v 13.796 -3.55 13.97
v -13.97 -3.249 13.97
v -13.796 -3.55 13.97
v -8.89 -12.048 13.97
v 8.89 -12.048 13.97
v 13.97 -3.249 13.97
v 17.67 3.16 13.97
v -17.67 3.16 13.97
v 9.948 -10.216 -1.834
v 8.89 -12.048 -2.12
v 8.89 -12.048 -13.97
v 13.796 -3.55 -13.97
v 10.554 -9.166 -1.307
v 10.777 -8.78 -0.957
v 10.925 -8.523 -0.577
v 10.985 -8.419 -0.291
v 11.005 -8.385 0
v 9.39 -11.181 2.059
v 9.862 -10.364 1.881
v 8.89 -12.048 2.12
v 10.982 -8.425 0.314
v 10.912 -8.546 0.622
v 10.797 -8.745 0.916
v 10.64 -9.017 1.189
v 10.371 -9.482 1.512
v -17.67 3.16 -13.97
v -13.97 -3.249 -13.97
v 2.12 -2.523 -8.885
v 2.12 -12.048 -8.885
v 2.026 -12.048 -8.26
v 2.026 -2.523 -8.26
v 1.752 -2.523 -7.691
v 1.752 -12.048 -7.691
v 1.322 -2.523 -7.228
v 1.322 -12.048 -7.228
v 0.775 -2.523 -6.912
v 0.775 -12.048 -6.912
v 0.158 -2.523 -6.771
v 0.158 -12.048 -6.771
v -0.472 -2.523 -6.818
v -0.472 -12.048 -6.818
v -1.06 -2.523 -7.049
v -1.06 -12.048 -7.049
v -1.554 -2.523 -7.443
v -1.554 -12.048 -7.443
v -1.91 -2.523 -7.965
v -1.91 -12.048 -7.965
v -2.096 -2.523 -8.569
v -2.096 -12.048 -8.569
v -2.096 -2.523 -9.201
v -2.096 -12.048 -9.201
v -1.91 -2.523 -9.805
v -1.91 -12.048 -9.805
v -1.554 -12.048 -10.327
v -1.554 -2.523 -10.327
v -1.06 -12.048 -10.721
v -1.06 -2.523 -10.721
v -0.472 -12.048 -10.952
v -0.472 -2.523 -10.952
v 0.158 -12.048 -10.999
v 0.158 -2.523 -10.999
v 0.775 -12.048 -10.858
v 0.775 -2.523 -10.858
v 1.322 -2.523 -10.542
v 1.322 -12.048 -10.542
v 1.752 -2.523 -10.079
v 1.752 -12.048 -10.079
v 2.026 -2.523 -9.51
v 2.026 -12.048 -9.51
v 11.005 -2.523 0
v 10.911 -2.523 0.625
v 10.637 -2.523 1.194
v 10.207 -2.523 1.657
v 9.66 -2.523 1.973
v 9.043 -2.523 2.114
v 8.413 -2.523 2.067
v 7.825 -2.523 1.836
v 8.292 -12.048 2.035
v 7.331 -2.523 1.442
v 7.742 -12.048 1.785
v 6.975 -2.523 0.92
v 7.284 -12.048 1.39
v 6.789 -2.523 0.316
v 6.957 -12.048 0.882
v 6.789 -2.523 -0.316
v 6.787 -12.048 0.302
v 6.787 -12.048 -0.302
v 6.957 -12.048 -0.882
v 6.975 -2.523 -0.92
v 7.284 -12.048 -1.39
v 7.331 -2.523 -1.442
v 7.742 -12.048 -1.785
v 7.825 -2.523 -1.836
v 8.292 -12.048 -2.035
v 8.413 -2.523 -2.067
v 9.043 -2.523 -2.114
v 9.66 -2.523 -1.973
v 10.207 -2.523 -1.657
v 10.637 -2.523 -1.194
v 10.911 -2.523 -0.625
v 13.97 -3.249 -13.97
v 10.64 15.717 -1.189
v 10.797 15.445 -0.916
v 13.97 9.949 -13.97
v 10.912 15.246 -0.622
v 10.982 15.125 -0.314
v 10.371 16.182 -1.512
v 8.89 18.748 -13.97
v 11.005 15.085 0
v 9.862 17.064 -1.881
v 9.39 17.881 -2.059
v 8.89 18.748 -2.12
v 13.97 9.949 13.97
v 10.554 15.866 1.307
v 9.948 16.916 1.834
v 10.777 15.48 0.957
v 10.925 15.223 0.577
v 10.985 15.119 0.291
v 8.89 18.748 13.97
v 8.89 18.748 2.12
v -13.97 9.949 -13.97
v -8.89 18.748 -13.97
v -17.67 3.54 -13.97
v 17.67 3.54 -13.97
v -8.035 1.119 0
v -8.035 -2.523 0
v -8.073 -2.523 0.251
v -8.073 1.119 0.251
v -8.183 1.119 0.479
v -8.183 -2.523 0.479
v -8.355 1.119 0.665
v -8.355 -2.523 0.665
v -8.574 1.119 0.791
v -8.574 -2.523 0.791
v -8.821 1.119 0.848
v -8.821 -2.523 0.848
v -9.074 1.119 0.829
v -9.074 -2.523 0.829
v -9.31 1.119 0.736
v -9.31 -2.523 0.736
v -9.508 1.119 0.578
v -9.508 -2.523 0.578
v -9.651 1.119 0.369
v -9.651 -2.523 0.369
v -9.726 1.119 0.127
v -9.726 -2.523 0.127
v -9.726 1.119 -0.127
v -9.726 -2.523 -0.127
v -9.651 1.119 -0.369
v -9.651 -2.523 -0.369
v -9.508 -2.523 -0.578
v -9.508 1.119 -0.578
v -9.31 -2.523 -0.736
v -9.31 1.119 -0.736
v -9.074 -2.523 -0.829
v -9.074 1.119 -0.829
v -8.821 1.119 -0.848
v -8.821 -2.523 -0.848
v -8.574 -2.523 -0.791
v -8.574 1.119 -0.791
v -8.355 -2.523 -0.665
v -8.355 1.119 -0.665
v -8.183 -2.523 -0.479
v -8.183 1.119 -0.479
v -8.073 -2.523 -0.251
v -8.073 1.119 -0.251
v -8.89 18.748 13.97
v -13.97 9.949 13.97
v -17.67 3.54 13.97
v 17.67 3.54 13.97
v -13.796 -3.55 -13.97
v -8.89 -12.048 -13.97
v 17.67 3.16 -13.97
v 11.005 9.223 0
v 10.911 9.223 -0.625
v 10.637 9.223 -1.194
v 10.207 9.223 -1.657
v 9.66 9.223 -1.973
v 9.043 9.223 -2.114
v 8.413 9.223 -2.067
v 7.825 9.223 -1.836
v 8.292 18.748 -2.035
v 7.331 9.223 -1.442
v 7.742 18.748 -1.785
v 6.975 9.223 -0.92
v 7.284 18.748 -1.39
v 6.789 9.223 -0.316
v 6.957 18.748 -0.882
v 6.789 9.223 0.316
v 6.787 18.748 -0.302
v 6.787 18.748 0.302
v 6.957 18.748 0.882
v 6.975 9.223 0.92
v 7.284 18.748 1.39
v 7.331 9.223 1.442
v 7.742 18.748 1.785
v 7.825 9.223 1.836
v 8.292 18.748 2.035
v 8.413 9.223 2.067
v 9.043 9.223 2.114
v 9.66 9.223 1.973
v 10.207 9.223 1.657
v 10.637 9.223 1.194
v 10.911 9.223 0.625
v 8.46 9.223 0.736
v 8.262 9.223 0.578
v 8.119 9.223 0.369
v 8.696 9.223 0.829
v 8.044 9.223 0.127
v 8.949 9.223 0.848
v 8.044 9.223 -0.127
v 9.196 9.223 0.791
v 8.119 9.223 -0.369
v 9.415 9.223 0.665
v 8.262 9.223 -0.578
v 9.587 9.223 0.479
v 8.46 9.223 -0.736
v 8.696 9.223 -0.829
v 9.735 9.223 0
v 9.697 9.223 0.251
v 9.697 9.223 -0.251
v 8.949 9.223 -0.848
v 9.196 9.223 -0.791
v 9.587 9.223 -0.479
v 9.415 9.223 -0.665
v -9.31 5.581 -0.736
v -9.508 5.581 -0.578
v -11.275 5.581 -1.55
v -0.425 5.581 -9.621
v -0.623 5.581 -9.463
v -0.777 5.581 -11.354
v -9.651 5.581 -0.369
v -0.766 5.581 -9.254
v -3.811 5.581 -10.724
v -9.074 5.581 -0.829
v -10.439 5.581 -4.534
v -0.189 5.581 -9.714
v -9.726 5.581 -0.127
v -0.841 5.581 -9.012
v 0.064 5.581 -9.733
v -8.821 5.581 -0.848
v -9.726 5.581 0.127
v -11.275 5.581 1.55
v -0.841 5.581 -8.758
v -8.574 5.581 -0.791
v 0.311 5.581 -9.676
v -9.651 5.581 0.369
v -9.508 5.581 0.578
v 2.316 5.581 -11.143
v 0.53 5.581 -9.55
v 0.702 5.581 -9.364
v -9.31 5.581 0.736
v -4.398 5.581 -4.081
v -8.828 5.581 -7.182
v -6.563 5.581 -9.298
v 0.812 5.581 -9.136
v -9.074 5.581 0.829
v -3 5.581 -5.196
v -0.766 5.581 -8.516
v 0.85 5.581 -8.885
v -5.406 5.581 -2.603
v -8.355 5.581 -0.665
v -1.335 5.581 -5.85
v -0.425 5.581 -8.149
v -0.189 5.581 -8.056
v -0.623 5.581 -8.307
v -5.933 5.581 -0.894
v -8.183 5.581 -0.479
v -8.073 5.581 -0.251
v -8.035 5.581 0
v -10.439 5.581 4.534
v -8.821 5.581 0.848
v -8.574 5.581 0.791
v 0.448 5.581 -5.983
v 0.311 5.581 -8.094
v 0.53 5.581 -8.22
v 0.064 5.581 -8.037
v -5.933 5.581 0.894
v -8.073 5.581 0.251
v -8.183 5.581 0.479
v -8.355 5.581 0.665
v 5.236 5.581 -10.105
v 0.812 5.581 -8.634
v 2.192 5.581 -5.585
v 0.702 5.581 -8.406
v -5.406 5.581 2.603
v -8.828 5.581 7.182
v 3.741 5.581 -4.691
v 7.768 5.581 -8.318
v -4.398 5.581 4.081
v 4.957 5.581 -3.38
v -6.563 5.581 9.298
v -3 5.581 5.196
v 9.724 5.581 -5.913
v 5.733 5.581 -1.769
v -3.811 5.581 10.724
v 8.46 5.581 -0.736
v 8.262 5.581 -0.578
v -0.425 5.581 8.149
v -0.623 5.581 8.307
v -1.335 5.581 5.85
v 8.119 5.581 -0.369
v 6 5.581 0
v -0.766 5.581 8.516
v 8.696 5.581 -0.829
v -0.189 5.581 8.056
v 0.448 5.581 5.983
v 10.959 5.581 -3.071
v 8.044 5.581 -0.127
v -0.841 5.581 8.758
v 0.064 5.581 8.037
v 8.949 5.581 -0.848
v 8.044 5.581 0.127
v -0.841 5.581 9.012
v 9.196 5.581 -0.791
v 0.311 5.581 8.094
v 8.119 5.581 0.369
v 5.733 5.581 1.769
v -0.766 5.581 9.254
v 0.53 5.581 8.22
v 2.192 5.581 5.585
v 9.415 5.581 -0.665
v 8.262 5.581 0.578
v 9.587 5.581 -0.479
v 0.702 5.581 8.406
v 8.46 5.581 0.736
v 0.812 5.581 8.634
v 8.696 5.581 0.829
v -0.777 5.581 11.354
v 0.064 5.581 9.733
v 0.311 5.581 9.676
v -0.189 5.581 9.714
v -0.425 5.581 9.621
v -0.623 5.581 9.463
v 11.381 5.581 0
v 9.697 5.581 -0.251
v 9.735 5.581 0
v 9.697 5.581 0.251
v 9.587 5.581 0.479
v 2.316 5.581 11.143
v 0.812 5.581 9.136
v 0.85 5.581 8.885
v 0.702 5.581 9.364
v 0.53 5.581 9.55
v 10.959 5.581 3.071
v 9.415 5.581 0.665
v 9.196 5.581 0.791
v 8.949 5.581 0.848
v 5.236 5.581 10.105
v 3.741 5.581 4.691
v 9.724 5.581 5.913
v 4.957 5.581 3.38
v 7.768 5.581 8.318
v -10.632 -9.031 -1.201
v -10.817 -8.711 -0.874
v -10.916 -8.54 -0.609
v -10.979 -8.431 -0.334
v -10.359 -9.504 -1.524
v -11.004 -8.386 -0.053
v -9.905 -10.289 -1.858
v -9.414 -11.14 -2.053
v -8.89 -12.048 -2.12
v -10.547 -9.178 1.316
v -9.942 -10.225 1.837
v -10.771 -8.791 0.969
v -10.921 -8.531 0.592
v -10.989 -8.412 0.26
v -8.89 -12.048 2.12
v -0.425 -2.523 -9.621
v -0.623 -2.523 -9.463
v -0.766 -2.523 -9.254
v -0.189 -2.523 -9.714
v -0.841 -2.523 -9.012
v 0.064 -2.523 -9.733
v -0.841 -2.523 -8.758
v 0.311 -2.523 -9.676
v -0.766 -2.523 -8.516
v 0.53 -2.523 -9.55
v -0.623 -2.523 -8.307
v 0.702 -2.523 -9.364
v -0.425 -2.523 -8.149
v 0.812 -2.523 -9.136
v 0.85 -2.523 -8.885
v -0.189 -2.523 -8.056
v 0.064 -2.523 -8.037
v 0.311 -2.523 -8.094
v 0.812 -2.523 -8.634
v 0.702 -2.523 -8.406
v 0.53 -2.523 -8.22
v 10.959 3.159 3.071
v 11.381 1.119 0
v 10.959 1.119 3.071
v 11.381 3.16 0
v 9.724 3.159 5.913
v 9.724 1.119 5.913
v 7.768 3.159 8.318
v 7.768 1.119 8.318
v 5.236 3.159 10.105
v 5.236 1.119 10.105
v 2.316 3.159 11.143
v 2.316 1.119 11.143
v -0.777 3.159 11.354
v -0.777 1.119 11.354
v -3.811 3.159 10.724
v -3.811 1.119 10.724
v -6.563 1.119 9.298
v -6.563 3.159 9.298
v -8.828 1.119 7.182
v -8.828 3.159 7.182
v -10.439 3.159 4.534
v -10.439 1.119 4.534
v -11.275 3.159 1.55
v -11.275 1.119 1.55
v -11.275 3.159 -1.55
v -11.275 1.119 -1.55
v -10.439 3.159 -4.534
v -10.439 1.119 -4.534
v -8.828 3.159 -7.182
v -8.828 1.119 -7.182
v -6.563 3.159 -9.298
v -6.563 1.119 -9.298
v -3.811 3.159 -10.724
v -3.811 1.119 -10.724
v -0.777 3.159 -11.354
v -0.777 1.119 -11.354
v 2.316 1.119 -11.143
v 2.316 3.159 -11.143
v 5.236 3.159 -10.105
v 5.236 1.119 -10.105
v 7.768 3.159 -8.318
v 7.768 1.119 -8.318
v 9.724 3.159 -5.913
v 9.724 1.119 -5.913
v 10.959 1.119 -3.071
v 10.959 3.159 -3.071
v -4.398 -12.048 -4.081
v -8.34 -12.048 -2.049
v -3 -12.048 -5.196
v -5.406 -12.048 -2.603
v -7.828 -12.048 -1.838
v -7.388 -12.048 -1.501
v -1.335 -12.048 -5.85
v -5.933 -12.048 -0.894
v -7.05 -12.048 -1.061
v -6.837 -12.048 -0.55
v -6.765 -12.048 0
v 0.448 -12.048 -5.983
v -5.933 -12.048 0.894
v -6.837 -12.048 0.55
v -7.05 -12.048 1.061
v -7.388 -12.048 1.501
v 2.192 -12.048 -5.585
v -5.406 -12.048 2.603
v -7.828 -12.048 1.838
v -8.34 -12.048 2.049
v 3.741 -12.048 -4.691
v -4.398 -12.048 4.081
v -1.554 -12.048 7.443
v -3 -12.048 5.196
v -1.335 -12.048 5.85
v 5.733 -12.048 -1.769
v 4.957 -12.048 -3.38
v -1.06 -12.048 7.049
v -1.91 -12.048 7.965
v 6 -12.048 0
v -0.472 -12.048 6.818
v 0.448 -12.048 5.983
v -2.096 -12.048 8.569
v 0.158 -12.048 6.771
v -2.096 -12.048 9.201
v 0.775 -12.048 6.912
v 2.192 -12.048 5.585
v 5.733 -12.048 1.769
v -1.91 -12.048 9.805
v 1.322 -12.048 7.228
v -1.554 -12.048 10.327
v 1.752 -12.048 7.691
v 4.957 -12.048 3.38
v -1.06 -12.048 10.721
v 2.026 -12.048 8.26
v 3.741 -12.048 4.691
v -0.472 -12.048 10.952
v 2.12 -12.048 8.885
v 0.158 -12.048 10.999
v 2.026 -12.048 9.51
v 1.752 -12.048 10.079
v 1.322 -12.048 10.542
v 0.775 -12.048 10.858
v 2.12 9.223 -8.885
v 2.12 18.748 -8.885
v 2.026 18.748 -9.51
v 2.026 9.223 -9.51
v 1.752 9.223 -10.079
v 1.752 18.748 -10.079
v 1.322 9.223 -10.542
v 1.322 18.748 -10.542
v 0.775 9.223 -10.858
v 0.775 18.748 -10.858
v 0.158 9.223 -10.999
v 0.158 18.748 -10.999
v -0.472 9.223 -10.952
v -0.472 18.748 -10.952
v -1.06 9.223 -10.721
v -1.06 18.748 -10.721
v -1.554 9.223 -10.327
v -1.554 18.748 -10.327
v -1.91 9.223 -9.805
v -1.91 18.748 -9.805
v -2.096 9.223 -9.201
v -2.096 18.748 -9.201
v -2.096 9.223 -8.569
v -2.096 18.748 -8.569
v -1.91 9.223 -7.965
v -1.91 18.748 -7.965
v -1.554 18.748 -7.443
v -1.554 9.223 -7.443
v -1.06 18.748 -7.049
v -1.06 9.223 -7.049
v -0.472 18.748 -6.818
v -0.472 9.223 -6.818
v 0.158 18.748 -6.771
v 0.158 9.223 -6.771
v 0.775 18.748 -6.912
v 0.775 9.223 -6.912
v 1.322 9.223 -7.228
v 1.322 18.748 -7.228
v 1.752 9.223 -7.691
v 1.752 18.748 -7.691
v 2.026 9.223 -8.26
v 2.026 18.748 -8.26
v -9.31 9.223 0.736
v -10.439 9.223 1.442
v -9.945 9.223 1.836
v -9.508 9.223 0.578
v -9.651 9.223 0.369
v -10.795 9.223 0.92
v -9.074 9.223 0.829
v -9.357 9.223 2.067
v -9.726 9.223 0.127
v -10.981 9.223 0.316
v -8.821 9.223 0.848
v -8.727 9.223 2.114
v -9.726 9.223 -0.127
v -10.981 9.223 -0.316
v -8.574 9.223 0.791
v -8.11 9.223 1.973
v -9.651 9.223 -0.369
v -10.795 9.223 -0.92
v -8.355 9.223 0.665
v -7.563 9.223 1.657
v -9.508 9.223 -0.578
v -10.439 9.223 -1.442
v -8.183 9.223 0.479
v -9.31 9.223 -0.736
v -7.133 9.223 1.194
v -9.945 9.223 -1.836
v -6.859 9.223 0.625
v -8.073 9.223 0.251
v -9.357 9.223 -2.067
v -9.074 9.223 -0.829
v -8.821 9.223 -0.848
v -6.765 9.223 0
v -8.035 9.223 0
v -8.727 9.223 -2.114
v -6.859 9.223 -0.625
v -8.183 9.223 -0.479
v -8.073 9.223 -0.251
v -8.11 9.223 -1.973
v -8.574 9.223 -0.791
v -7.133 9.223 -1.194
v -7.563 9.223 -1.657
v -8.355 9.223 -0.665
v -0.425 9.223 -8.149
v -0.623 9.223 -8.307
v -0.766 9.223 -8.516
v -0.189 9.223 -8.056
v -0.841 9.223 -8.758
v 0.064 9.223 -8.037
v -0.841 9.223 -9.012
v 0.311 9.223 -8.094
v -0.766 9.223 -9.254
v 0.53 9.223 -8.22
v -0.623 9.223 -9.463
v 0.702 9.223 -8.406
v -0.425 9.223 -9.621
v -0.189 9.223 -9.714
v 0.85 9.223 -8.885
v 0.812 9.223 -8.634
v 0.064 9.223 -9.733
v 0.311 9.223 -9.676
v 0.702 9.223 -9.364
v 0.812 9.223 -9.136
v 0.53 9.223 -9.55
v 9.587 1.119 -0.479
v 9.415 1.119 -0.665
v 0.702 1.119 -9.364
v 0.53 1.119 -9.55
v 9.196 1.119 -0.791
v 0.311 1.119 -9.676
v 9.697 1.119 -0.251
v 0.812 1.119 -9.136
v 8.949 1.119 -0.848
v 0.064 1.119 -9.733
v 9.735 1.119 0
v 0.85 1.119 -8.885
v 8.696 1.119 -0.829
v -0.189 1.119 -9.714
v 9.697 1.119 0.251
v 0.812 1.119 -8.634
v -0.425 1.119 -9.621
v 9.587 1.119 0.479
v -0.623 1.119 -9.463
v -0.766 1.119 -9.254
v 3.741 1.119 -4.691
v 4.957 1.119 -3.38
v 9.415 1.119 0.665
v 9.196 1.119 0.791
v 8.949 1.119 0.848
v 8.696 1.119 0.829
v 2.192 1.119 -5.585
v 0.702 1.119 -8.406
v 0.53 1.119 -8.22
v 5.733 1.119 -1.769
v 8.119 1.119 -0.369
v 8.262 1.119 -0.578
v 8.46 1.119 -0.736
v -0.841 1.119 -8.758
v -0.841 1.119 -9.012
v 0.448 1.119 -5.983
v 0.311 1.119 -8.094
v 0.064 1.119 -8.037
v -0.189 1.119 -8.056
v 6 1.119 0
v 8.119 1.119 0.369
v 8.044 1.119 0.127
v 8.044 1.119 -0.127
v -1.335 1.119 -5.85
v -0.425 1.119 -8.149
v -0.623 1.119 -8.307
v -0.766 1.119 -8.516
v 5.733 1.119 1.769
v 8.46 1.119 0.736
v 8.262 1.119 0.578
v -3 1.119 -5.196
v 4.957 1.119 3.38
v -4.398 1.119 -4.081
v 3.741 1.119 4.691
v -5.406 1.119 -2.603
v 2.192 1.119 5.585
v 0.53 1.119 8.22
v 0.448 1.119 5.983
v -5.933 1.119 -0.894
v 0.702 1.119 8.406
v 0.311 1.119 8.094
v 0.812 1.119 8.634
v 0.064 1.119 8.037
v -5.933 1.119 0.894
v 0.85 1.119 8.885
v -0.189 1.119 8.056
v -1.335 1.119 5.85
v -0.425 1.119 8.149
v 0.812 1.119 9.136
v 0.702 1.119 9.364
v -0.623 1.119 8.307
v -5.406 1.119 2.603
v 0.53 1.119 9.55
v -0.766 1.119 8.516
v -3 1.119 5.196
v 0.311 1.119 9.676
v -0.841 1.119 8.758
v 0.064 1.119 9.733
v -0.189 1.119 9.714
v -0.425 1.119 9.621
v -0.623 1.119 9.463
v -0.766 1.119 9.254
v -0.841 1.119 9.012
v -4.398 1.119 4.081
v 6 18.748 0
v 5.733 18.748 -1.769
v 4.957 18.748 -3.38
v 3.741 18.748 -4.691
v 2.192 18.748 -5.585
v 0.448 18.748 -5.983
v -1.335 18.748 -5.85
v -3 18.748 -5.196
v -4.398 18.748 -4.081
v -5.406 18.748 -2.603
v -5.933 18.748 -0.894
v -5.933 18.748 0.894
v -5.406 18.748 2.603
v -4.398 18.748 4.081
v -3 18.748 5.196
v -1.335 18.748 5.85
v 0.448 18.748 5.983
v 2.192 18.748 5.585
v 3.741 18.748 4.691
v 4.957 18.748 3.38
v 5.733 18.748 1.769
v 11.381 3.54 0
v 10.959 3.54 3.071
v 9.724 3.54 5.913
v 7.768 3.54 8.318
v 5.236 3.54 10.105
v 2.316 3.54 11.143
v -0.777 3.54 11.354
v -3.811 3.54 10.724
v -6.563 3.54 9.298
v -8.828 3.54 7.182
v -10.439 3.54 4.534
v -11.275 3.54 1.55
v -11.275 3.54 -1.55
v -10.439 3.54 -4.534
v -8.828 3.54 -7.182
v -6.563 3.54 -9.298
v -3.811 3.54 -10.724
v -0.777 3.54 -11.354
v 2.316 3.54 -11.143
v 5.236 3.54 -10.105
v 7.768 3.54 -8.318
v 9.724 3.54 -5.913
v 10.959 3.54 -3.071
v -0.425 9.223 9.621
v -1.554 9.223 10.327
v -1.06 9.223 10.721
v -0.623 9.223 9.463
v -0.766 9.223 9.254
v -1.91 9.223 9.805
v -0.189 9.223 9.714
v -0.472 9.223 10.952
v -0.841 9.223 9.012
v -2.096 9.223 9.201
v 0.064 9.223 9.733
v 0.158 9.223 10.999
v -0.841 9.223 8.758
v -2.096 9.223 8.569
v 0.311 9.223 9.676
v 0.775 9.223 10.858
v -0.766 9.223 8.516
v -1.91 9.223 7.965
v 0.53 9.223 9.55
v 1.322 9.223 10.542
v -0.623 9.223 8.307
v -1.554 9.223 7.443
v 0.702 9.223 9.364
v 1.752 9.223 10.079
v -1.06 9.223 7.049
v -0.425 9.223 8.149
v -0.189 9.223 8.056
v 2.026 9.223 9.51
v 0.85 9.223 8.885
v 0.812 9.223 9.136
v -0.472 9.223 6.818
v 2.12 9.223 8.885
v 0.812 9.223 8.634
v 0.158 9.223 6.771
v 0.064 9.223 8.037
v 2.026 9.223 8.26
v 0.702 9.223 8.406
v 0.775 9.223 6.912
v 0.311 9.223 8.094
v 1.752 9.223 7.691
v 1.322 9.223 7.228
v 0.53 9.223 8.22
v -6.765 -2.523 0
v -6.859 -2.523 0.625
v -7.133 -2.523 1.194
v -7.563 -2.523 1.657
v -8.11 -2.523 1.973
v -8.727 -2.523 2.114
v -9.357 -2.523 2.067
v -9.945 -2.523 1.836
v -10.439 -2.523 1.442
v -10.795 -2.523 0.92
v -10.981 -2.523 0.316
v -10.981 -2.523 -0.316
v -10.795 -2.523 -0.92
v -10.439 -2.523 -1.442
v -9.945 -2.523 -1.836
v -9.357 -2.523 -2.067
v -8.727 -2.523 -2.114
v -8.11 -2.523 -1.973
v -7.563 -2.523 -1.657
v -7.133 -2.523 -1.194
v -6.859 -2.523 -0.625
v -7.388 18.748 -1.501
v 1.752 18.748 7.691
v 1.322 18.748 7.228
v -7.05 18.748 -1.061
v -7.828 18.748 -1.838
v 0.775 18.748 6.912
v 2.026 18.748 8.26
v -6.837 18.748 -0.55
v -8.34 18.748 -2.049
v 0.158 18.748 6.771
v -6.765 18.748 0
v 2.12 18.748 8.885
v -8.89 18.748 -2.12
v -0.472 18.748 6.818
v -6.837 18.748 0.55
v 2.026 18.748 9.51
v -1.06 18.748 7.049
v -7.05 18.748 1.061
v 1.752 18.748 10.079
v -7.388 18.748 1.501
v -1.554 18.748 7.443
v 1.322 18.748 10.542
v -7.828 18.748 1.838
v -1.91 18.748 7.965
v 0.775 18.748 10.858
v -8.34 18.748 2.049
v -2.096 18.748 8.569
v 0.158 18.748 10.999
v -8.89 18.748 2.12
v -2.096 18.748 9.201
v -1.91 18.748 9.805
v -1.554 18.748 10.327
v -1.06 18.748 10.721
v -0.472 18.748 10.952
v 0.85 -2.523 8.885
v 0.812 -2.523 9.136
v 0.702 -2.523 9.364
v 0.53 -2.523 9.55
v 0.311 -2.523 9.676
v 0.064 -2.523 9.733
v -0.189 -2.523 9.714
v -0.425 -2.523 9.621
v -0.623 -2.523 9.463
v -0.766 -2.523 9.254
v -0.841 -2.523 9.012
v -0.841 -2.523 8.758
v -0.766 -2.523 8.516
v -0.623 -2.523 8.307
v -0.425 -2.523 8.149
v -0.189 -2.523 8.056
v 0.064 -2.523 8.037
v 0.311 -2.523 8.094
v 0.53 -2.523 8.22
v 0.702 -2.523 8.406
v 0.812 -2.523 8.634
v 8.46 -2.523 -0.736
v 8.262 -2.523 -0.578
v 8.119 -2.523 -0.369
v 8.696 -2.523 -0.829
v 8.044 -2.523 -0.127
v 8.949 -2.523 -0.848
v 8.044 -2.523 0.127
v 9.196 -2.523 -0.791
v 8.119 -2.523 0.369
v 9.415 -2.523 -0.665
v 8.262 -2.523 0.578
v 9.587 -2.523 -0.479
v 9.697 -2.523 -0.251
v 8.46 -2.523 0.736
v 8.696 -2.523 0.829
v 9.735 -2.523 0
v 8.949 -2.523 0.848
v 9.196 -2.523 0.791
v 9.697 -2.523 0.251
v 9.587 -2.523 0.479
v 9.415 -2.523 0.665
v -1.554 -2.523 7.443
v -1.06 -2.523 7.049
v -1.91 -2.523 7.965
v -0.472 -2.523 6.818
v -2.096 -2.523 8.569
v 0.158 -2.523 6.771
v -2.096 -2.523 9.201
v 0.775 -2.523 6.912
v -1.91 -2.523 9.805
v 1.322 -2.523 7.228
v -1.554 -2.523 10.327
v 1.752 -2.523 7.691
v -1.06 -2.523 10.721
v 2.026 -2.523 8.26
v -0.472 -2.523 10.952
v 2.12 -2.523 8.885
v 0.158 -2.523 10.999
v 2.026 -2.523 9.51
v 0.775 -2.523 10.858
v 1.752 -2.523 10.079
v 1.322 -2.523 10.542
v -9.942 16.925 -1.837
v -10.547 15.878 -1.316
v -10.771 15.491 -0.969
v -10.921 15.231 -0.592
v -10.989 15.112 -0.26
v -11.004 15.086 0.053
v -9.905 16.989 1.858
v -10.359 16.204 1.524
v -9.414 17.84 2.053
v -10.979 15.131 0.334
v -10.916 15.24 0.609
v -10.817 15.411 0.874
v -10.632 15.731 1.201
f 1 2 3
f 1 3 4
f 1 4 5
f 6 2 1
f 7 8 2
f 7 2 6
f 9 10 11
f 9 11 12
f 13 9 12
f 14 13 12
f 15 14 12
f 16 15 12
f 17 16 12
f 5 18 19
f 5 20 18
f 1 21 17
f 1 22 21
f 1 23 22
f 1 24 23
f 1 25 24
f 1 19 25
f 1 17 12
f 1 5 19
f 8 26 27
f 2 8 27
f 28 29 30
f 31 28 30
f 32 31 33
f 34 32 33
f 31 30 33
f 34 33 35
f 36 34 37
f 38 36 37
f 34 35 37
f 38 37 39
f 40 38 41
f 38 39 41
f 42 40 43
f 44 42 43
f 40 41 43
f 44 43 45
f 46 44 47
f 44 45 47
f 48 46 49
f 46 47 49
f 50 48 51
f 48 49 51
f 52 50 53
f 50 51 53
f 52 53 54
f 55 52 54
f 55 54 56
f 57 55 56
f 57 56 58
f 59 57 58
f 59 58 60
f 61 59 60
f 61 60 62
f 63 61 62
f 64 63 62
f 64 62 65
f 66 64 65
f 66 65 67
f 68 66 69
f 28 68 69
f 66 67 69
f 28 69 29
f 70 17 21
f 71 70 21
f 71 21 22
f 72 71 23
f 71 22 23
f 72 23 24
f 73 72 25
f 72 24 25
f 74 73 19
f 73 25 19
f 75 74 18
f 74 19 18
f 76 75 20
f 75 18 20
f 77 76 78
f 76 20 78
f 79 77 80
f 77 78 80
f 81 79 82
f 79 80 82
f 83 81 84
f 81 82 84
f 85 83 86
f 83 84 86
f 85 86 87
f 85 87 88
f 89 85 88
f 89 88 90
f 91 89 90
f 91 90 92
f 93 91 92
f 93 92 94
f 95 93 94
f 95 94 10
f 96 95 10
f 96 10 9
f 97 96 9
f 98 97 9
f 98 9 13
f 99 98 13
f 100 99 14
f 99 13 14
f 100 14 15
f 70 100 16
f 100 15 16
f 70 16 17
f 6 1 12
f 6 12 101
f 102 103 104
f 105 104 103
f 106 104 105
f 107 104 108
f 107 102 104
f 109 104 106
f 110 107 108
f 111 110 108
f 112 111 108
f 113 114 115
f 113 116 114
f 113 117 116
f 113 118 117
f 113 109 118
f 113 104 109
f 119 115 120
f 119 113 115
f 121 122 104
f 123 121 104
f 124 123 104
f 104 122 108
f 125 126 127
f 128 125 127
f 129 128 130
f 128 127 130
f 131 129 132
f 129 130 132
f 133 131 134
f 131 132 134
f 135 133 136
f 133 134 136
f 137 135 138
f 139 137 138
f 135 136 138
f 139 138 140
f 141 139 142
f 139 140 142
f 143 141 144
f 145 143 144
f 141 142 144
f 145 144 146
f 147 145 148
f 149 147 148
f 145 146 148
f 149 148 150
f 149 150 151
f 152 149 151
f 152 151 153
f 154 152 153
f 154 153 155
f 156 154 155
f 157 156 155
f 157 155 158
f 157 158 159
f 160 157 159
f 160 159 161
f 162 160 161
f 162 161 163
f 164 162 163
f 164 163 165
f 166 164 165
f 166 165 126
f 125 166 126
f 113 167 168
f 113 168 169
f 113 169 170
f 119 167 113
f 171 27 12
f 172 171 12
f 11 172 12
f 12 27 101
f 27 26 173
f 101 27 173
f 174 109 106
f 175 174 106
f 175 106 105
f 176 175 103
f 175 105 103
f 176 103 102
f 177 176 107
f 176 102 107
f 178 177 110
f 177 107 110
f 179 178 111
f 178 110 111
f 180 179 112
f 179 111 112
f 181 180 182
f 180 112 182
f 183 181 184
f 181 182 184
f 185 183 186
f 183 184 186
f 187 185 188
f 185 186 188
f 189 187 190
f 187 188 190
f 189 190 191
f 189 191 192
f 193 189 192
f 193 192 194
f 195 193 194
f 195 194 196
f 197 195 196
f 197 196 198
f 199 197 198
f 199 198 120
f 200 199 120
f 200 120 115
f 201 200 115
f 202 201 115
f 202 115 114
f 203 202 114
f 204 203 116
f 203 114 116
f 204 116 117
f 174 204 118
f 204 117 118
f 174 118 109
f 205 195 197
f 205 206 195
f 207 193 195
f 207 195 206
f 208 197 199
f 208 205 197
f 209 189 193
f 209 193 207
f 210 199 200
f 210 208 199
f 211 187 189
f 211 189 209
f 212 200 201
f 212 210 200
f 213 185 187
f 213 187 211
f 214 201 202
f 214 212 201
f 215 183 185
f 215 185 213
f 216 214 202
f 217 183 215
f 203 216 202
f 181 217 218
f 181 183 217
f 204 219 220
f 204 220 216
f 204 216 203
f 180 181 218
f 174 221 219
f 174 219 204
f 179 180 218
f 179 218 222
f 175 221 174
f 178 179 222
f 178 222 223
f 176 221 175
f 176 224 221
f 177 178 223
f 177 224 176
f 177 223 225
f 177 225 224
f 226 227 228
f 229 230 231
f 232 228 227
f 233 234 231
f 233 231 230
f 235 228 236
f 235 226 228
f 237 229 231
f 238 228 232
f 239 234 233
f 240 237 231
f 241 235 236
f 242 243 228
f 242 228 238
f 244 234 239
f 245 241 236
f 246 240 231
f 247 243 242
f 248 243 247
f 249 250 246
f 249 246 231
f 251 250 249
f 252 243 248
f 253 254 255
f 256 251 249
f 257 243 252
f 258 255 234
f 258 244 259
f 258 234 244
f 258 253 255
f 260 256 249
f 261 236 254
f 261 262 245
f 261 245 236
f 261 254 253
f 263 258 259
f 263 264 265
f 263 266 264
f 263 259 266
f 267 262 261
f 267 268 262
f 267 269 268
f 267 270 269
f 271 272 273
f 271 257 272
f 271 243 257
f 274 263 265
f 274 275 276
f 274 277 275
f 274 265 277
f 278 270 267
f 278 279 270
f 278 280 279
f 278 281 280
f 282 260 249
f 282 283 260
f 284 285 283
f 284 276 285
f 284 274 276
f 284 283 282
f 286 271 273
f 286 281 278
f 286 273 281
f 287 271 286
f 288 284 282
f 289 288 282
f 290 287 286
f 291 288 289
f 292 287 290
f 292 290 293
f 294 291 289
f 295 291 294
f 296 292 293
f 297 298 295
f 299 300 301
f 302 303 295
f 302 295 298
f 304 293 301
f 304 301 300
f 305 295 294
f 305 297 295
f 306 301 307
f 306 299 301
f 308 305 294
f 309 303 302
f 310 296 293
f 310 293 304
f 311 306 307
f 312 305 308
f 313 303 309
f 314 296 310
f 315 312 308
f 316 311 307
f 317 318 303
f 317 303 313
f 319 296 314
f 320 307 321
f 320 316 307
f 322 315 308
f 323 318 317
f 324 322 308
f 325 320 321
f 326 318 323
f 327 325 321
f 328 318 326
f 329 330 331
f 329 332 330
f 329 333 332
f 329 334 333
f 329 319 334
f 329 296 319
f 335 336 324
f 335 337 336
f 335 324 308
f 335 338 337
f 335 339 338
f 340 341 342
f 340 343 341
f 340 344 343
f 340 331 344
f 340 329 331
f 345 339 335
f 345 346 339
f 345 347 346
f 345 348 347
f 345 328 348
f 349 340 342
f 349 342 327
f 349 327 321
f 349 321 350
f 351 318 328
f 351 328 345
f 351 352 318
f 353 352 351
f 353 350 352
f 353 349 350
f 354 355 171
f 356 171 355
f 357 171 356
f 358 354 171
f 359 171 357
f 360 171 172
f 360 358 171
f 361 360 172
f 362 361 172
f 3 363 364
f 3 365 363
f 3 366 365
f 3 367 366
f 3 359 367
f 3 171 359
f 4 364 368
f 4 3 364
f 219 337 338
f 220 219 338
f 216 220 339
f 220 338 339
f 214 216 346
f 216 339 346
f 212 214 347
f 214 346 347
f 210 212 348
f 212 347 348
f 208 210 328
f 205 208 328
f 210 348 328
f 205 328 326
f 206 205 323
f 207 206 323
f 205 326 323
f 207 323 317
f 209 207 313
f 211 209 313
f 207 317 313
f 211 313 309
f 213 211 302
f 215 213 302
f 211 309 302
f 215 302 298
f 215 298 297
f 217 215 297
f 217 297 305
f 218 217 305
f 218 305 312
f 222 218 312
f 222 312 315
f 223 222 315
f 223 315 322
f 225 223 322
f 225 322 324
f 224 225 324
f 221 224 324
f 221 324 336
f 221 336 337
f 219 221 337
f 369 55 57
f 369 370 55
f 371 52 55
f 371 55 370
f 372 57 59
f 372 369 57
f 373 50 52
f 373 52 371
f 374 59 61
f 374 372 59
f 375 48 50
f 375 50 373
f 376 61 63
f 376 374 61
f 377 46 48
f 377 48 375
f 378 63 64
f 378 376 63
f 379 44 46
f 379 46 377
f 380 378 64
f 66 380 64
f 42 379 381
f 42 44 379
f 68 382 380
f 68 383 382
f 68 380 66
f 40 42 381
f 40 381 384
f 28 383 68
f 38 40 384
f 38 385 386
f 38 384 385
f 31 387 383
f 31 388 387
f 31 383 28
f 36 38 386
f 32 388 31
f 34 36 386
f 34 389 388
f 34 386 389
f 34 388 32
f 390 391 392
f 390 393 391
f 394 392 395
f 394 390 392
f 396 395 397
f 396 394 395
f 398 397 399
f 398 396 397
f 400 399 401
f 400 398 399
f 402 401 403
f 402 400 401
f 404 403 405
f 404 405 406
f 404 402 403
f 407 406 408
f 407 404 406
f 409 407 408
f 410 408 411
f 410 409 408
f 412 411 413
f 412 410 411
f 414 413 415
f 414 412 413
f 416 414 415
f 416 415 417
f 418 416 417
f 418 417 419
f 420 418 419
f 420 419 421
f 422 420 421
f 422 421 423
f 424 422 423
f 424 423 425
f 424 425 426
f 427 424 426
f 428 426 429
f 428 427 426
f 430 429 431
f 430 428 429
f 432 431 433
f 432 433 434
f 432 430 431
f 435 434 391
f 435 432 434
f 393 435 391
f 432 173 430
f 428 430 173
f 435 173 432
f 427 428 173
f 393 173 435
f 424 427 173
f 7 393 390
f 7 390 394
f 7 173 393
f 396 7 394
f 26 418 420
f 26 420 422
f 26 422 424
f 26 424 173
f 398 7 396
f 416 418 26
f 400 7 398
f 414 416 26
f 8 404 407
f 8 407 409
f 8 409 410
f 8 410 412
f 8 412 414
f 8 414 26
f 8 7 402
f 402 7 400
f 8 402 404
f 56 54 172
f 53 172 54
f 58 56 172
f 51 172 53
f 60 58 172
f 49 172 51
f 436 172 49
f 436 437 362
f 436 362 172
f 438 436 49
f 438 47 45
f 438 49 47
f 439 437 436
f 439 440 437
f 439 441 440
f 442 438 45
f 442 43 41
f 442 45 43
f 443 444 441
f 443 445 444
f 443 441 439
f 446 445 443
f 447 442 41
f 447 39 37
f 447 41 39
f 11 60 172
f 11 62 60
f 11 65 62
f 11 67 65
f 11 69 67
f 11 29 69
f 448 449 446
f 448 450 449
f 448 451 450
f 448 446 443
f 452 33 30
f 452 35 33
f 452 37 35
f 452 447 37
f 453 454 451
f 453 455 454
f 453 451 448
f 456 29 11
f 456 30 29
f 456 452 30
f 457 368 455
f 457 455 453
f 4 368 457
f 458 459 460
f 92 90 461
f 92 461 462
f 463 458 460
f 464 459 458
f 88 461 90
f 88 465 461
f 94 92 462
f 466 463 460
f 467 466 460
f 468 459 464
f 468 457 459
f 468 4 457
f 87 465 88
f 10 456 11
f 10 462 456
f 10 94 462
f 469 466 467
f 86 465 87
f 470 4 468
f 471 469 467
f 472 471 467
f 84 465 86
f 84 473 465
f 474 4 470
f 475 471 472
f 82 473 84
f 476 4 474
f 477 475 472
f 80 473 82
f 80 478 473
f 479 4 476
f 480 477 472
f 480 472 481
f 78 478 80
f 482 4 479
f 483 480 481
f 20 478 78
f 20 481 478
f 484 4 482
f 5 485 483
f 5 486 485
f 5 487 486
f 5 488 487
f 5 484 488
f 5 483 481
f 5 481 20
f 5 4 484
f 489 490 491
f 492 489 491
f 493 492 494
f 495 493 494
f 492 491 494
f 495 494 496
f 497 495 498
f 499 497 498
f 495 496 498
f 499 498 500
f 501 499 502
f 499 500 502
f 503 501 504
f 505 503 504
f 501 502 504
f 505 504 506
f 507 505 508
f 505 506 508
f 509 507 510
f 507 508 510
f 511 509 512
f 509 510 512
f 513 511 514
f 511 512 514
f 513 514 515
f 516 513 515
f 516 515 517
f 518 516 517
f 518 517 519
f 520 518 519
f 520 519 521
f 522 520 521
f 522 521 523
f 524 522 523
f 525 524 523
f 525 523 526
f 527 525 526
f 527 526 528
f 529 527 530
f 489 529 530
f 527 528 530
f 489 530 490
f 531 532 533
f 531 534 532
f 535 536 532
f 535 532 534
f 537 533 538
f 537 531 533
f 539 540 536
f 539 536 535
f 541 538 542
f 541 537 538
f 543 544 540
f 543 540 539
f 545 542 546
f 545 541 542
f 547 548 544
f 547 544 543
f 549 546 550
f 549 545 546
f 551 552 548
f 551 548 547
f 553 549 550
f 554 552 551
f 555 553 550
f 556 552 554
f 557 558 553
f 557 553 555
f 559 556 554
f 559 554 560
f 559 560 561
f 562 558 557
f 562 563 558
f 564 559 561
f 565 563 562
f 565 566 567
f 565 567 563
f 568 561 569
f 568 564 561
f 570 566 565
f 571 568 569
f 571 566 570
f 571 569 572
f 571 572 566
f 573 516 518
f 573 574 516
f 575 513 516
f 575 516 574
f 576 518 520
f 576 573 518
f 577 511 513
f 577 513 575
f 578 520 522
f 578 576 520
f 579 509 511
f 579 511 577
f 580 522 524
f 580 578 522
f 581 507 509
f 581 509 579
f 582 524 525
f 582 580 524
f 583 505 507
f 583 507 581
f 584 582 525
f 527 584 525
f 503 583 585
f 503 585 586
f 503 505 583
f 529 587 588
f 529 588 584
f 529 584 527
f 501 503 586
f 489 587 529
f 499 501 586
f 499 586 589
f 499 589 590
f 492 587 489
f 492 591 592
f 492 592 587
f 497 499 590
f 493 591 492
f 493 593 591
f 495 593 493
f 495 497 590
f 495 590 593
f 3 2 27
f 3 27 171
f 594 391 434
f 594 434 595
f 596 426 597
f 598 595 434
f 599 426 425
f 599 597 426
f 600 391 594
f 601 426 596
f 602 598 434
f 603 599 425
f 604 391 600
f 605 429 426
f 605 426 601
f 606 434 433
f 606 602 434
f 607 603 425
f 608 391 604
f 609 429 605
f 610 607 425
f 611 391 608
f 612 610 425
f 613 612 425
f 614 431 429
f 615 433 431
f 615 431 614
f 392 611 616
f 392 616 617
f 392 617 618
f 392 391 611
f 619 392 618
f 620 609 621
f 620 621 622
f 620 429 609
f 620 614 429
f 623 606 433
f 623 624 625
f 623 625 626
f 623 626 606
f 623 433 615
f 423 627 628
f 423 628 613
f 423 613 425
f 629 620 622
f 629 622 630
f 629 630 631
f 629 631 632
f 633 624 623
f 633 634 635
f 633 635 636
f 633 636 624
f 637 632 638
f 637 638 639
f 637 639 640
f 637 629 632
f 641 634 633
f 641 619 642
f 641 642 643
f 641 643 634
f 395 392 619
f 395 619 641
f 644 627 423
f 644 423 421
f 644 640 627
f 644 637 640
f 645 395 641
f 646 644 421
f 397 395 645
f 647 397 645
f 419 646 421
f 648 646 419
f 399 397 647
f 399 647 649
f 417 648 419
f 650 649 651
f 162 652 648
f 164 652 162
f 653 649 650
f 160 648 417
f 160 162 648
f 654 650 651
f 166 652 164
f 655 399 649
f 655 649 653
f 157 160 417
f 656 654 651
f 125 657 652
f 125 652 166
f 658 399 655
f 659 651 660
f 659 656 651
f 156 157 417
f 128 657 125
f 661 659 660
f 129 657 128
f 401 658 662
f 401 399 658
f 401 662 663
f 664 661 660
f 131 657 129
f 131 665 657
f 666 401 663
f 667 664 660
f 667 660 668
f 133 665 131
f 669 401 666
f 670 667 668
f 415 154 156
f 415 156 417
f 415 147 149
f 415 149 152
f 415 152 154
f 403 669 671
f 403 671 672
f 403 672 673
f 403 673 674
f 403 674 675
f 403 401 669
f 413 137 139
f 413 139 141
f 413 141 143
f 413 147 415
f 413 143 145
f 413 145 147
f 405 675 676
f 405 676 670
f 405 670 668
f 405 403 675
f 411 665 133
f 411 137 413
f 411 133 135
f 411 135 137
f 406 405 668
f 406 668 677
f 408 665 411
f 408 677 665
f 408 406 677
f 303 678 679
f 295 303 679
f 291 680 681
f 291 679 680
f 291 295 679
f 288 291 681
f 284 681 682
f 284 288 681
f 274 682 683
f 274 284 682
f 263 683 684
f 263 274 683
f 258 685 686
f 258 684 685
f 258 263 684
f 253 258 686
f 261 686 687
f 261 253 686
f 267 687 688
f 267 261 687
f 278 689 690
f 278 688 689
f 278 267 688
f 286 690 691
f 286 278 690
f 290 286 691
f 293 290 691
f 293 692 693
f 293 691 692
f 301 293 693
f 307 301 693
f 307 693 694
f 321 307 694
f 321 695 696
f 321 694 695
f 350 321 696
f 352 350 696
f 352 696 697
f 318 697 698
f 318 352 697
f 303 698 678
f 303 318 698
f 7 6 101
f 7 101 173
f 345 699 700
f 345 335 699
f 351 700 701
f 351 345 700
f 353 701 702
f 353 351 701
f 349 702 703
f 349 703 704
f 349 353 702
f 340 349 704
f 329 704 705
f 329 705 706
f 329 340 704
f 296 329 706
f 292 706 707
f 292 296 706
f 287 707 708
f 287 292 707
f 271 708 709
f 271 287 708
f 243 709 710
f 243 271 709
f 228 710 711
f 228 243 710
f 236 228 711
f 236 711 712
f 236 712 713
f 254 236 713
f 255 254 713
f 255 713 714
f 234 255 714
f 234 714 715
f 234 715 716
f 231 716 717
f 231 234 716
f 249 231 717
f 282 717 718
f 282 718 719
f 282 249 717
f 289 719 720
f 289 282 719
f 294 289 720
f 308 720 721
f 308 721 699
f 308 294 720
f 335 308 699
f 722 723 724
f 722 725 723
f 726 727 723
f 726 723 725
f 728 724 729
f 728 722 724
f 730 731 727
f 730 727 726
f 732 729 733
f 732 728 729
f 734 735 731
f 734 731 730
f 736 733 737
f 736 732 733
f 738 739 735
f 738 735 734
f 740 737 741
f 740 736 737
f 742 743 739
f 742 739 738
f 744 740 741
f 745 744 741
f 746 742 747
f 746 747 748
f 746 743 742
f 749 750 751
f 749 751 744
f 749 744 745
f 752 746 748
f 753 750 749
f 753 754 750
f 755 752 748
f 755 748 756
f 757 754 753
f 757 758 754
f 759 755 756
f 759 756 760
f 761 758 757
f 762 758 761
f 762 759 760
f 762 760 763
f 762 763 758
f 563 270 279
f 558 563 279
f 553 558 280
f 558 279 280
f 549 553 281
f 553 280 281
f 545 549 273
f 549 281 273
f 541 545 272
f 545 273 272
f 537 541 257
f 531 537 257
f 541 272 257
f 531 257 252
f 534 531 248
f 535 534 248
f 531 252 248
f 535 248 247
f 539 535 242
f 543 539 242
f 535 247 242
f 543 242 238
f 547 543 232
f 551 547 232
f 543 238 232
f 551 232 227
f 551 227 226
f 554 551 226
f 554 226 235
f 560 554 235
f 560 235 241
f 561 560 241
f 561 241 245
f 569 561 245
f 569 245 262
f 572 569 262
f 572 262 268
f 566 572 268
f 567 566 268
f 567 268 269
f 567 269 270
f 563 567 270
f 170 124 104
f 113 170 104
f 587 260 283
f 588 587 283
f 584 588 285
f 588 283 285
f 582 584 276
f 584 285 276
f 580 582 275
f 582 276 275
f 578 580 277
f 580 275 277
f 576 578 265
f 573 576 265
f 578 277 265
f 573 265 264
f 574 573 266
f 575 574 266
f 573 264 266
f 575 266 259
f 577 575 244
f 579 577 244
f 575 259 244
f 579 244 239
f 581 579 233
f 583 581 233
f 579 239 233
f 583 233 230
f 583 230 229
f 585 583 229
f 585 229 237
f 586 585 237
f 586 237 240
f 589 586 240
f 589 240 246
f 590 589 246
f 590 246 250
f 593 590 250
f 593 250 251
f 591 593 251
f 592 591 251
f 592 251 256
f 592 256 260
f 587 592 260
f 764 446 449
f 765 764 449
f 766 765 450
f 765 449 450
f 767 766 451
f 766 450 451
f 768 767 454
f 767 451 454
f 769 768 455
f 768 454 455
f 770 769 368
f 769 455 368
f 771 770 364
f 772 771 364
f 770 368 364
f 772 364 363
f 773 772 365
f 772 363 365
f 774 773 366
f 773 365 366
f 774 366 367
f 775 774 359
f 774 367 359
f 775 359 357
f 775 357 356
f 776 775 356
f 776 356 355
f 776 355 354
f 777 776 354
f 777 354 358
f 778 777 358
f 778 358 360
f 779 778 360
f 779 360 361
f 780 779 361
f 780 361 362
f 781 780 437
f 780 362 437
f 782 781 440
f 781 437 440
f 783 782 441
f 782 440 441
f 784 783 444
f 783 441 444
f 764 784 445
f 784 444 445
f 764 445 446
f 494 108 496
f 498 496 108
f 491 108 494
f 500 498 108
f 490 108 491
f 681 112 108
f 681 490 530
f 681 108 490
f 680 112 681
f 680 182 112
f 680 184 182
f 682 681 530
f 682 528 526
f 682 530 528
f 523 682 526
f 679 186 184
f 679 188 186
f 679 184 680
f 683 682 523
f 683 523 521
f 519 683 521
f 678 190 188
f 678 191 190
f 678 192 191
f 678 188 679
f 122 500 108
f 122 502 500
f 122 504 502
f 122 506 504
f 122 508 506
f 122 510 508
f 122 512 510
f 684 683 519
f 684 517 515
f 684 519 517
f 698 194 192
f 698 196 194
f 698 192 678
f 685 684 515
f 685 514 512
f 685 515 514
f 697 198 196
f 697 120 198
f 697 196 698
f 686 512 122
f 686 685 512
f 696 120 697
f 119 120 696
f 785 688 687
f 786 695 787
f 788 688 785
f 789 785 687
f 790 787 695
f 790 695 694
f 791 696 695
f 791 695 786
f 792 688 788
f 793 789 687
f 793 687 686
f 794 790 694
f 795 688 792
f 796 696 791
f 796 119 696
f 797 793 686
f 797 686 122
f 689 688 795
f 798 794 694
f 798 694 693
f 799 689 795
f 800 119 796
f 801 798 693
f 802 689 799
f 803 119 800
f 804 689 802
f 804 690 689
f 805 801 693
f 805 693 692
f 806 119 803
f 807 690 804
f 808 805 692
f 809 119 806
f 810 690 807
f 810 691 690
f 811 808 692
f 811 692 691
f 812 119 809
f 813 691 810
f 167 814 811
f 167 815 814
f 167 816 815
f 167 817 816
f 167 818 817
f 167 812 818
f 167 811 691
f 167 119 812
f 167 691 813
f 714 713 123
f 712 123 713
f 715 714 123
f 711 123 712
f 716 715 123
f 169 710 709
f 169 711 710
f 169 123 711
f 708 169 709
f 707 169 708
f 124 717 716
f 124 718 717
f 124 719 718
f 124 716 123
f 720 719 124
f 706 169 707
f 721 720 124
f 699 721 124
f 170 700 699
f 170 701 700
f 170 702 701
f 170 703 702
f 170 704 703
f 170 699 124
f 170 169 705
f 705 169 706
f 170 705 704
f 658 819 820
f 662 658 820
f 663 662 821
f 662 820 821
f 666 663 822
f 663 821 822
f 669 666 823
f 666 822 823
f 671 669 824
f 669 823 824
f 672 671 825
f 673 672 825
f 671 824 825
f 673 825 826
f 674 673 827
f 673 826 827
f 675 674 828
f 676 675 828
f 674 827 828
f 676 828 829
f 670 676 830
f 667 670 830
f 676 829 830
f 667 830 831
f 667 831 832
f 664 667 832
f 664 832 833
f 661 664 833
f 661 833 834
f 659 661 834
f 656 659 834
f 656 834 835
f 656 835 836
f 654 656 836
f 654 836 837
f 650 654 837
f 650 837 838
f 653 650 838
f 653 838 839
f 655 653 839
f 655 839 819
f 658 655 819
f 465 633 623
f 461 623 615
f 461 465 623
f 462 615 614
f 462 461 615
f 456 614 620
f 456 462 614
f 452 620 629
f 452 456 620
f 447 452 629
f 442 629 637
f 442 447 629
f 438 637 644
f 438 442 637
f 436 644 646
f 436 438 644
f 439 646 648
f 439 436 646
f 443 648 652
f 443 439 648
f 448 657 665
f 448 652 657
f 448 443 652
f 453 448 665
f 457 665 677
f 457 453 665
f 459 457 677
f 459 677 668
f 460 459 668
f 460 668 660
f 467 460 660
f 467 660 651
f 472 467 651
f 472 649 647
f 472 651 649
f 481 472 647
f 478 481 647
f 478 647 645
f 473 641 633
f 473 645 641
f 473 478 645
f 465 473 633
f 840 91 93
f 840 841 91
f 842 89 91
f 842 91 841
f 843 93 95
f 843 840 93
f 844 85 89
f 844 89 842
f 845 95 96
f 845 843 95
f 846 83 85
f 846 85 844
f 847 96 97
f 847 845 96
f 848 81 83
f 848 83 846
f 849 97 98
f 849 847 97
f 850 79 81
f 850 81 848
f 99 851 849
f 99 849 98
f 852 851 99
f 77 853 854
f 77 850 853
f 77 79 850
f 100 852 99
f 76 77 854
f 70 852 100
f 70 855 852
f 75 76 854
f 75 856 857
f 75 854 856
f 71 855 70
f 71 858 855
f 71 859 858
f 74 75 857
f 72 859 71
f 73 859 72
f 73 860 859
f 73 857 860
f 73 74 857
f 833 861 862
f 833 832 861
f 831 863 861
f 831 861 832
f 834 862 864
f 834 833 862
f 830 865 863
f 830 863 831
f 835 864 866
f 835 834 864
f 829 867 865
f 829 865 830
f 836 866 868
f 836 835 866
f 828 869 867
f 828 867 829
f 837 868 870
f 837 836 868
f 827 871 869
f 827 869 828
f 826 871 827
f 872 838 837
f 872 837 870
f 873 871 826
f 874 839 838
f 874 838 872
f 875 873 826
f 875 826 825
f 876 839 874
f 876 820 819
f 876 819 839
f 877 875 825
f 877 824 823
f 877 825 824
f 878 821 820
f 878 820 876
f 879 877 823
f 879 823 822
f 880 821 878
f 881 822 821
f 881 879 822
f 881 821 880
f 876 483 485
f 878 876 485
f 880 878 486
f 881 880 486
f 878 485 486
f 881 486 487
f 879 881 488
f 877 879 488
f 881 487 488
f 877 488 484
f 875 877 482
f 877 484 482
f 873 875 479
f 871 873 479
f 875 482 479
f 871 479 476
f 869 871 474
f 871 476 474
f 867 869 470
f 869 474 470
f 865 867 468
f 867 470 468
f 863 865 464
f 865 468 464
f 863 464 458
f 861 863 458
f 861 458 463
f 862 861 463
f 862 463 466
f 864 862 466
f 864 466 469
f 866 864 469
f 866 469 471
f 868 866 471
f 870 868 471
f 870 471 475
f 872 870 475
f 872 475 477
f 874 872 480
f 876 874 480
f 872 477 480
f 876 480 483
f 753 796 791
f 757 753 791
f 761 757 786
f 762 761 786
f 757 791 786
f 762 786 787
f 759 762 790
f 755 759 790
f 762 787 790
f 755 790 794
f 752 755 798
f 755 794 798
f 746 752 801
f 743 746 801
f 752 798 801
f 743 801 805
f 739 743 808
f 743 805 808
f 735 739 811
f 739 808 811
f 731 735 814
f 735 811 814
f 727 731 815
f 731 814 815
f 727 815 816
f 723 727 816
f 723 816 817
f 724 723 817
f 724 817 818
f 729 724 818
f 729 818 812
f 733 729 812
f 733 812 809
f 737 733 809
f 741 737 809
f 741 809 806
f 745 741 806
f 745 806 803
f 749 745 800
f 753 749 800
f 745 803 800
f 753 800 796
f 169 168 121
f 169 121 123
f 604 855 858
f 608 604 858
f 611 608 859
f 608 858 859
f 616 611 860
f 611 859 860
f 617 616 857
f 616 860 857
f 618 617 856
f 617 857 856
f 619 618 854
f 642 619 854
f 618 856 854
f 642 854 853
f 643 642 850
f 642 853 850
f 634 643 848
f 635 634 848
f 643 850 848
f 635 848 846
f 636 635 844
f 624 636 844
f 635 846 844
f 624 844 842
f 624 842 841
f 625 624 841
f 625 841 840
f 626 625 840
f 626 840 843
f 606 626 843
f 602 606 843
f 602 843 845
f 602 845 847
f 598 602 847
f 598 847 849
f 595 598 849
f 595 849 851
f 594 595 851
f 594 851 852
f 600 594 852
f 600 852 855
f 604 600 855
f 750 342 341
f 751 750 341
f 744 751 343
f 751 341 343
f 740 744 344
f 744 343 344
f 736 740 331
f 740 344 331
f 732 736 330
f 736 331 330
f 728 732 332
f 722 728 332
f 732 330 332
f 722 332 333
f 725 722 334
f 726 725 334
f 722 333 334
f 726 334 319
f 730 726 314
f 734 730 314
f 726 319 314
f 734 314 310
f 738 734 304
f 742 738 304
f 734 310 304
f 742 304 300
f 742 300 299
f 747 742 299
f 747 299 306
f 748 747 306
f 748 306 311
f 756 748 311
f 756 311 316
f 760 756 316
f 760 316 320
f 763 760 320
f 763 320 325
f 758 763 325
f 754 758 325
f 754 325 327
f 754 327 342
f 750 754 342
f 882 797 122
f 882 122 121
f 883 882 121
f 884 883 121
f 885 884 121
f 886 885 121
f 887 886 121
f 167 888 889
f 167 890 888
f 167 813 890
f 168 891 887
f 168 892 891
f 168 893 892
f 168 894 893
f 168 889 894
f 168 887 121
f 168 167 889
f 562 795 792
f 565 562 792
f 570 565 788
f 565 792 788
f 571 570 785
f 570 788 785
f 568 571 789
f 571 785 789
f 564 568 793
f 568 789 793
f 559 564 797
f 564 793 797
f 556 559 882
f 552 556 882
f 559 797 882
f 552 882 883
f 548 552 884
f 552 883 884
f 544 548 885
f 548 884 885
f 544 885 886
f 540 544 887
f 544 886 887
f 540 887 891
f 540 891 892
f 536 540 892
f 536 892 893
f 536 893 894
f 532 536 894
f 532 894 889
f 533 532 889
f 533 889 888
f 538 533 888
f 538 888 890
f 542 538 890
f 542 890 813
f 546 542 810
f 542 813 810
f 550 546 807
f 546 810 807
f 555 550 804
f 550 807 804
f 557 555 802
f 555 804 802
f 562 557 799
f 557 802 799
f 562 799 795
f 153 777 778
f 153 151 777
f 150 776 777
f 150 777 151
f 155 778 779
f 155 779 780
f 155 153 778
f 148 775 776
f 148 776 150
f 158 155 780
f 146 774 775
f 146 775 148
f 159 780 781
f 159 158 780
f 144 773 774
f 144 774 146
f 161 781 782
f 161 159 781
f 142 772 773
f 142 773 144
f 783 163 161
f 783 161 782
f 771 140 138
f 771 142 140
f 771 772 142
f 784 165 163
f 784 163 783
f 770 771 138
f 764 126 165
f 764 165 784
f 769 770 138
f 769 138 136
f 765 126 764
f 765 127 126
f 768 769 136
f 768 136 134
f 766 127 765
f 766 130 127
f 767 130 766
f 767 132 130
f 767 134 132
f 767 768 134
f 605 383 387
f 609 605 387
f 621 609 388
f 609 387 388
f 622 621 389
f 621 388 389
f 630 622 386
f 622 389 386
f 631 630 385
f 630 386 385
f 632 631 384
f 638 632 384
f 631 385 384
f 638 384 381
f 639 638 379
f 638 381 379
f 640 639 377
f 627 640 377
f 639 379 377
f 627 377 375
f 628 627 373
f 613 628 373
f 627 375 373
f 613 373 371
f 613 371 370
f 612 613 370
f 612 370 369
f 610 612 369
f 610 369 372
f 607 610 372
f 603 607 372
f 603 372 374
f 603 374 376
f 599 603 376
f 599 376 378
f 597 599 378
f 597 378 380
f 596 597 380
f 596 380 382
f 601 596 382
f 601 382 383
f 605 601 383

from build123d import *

# Parameters (mm, degrees)
SKETCH1_W                       = 27.94
SKETCH1_H                       = 15.7695
BOSS_EXTRUDE1_DEPTH             = 13.97
SKETCH1_H_2                     = 6.709500012
BOSS_EXTRUDE1_2_DEPTH           = 13.97
SKETCH4_R                       = 23.398189774
BODY_SHAPING_SQUARE_DEPTH       = 34.417
MAKING_THINGS_HEXAGONAL_DEPTH   = 27.94
SKETCH2_R                       = 6
THROUGH_HOLE_FOR_ACME_ROD_DEPTH = 31.795863359
SKETCH3_R                       = 0.85
BOLT_HOLES_DEPTH                = 1
BOLT_HOLES_DEPTH_BACK           = 31.795863359
SKETCH3_3_R                     = 2.12
CUT_EXTRUDE4_DEPTH              = 9.525
SKETCH5_R                       = 2.12
CUT_EXTRUDE5_DEPTH              = 9.525


with BuildPart() as part:
    # Sketch1 → Boss-Extrude1 (new body, symmetric)
    with BuildSketch(Plane.XY):
        with Locations((0, 11.42525)):
            Rectangle(SKETCH1_W, SKETCH1_H)
    extrude(amount=BOSS_EXTRUDE1_DEPTH, both=True)

    # Sketch1<6> → Cut-Revolve8 (revolve, cut)
    with BuildSketch(Plane.XY):
        Polygon((5.451, 15.881), (0, 15.881), (0, 3.5405), (11.381, 3.5405), (11.381, 5.581), (5.451, 5.581), align=None)
    revolve(axis=Axis((0, 19.31, 0), (0, -1, 0)), mode=Mode.SUBTRACT)


with BuildPart() as body_2:
    # Sketch1 → Boss-Extrude1 2 (new body, symmetric)
    with BuildSketch(Plane.XY):
        with Locations((0, -0.195250006)):
            Rectangle(SKETCH1_W, SKETCH1_H_2)
    extrude(amount=BOSS_EXTRUDE1_2_DEPTH, both=True)


with BuildPart() as body_shaping_square_tool:
    # Sketch4 → Body Shaping - Square (new body)
    with BuildSketch(Plane.XY.offset(13.97)):
        with Locations((0, 3.35)):
            Circle(SKETCH4_R)
        Polygon((-8.89, 18.747931679), (-17.78, 3.35), (-8.89, -12.047931679), (8.89, -12.047931679), (17.78, 3.35), (8.89, 18.747931679), align=None, mode=Mode.SUBTRACT)
    extrude(amount=-BODY_SHAPING_SQUARE_DEPTH)


with BuildPart() as part_1:
    add(part.part)

    # Body Shaping - Square: cut by body_shaping_square_tool
    add(body_shaping_square_tool.part, mode=Mode.SUBTRACT)



with BuildPart() as body_2_1:
    add(body_2.part)

    # Body Shaping - Square: cut by body_shaping_square_tool
    add(body_shaping_square_tool.part, mode=Mode.SUBTRACT)

    # Sketch1<7> → Cut-Revolve9 (revolve, cut)
    with BuildSketch(Plane.XY):
        Polygon((11.381, 3.1595), (0, 3.1595), (0, -0.381), (5.451, -0.381), (5.451, 1.119), (11.381, 1.119), align=None)
    revolve(axis=Axis((0, 15.881, 0), (0, -1, 0)), mode=Mode.SUBTRACT)


with BuildPart() as part_2:
    add(part_1.part)

    add(body_2_1.part)  # Making things hexagonal merges body 2
    # Sketch4<6> → Making things hexagonal (add)
    with BuildSketch(Plane.XY.offset(13.97)):
        Polygon((13.97, -3.249113577), (17.670014774, 3.1595), (13.97, 3.1595), align=None)
        Polygon((17.670014774, 3.5405), (13.97, 9.949113577), (13.97, 3.5405), align=None)
        Polygon((13.796283136, -3.550000012), (-13.796283136, -3.550000012), (-8.89, -12.047931679), (8.89, -12.047931679), align=None)
        Polygon((-13.97, 3.1595), (-17.670014774, 3.1595), (-13.97, -3.249113577), align=None)
        Polygon((-13.97, 3.5405), (-13.97, 9.949113577), (-17.670014774, 3.5405), align=None)
    extrude(amount=-MAKING_THINGS_HEXAGONAL_DEPTH)

    # Sketch2 → Through Hole for ACME Rod (cut, through all)
    with BuildSketch(Plane(origin=(0, -12.047931679, 0), x_dir=(1, 0, 0), z_dir=(0, 1, 0))):
        Circle(SKETCH2_R)
    extrude(amount=THROUGH_HOLE_FOR_ACME_ROD_DEPTH, mode=Mode.SUBTRACT)

    # Sketch3 → Bolt Holes (cut, two sides)
    with BuildSketch(Plane.XZ.offset(12.047931679)) as bolt_holes_sk:
        with Locations((-8.885, 0)):
            Circle(SKETCH3_R)
        with Locations((0, 8.885)):
            Circle(SKETCH3_R)
        with Locations((8.885, 0)):
            Circle(SKETCH3_R)
        with Locations((0, -8.885)):
            Circle(SKETCH3_R)
    extrude(amount=BOLT_HOLES_DEPTH, mode=Mode.SUBTRACT)
    extrude(bolt_holes_sk.sketch, amount=-BOLT_HOLES_DEPTH_BACK, mode=Mode.SUBTRACT)

    # Sketch3<3> → Cut-Extrude4 (cut)
    with BuildSketch(Plane.XZ.offset(12.047931679)):
        with Locations((-8.885, 0)):
            Circle(SKETCH3_3_R)
        with Locations((0, 8.885)):
            Circle(SKETCH3_3_R)
        with Locations((8.885, 0)):
            Circle(SKETCH3_3_R)
        with Locations((0, -8.885)):
            Circle(SKETCH3_3_R)
    extrude(amount=-CUT_EXTRUDE4_DEPTH, mode=Mode.SUBTRACT)

    # Sketch5 → Cut-Extrude5 (cut)
    with BuildSketch(Plane(origin=(0, 18.747931679, 0), x_dir=(1, 0, 0), z_dir=(0, 1, 0))):
        with Locations((0, 8.885)):
            Circle(SKETCH5_R)
        with Locations((-8.885, 0)):
            Circle(SKETCH5_R)
        with Locations((8.885, 0)):
            Circle(SKETCH5_R)
        with Locations((0, -8.885)):
            Circle(SKETCH5_R)
    extrude(amount=-CUT_EXTRUDE5_DEPTH, mode=Mode.SUBTRACT)


solid = part_2.part
